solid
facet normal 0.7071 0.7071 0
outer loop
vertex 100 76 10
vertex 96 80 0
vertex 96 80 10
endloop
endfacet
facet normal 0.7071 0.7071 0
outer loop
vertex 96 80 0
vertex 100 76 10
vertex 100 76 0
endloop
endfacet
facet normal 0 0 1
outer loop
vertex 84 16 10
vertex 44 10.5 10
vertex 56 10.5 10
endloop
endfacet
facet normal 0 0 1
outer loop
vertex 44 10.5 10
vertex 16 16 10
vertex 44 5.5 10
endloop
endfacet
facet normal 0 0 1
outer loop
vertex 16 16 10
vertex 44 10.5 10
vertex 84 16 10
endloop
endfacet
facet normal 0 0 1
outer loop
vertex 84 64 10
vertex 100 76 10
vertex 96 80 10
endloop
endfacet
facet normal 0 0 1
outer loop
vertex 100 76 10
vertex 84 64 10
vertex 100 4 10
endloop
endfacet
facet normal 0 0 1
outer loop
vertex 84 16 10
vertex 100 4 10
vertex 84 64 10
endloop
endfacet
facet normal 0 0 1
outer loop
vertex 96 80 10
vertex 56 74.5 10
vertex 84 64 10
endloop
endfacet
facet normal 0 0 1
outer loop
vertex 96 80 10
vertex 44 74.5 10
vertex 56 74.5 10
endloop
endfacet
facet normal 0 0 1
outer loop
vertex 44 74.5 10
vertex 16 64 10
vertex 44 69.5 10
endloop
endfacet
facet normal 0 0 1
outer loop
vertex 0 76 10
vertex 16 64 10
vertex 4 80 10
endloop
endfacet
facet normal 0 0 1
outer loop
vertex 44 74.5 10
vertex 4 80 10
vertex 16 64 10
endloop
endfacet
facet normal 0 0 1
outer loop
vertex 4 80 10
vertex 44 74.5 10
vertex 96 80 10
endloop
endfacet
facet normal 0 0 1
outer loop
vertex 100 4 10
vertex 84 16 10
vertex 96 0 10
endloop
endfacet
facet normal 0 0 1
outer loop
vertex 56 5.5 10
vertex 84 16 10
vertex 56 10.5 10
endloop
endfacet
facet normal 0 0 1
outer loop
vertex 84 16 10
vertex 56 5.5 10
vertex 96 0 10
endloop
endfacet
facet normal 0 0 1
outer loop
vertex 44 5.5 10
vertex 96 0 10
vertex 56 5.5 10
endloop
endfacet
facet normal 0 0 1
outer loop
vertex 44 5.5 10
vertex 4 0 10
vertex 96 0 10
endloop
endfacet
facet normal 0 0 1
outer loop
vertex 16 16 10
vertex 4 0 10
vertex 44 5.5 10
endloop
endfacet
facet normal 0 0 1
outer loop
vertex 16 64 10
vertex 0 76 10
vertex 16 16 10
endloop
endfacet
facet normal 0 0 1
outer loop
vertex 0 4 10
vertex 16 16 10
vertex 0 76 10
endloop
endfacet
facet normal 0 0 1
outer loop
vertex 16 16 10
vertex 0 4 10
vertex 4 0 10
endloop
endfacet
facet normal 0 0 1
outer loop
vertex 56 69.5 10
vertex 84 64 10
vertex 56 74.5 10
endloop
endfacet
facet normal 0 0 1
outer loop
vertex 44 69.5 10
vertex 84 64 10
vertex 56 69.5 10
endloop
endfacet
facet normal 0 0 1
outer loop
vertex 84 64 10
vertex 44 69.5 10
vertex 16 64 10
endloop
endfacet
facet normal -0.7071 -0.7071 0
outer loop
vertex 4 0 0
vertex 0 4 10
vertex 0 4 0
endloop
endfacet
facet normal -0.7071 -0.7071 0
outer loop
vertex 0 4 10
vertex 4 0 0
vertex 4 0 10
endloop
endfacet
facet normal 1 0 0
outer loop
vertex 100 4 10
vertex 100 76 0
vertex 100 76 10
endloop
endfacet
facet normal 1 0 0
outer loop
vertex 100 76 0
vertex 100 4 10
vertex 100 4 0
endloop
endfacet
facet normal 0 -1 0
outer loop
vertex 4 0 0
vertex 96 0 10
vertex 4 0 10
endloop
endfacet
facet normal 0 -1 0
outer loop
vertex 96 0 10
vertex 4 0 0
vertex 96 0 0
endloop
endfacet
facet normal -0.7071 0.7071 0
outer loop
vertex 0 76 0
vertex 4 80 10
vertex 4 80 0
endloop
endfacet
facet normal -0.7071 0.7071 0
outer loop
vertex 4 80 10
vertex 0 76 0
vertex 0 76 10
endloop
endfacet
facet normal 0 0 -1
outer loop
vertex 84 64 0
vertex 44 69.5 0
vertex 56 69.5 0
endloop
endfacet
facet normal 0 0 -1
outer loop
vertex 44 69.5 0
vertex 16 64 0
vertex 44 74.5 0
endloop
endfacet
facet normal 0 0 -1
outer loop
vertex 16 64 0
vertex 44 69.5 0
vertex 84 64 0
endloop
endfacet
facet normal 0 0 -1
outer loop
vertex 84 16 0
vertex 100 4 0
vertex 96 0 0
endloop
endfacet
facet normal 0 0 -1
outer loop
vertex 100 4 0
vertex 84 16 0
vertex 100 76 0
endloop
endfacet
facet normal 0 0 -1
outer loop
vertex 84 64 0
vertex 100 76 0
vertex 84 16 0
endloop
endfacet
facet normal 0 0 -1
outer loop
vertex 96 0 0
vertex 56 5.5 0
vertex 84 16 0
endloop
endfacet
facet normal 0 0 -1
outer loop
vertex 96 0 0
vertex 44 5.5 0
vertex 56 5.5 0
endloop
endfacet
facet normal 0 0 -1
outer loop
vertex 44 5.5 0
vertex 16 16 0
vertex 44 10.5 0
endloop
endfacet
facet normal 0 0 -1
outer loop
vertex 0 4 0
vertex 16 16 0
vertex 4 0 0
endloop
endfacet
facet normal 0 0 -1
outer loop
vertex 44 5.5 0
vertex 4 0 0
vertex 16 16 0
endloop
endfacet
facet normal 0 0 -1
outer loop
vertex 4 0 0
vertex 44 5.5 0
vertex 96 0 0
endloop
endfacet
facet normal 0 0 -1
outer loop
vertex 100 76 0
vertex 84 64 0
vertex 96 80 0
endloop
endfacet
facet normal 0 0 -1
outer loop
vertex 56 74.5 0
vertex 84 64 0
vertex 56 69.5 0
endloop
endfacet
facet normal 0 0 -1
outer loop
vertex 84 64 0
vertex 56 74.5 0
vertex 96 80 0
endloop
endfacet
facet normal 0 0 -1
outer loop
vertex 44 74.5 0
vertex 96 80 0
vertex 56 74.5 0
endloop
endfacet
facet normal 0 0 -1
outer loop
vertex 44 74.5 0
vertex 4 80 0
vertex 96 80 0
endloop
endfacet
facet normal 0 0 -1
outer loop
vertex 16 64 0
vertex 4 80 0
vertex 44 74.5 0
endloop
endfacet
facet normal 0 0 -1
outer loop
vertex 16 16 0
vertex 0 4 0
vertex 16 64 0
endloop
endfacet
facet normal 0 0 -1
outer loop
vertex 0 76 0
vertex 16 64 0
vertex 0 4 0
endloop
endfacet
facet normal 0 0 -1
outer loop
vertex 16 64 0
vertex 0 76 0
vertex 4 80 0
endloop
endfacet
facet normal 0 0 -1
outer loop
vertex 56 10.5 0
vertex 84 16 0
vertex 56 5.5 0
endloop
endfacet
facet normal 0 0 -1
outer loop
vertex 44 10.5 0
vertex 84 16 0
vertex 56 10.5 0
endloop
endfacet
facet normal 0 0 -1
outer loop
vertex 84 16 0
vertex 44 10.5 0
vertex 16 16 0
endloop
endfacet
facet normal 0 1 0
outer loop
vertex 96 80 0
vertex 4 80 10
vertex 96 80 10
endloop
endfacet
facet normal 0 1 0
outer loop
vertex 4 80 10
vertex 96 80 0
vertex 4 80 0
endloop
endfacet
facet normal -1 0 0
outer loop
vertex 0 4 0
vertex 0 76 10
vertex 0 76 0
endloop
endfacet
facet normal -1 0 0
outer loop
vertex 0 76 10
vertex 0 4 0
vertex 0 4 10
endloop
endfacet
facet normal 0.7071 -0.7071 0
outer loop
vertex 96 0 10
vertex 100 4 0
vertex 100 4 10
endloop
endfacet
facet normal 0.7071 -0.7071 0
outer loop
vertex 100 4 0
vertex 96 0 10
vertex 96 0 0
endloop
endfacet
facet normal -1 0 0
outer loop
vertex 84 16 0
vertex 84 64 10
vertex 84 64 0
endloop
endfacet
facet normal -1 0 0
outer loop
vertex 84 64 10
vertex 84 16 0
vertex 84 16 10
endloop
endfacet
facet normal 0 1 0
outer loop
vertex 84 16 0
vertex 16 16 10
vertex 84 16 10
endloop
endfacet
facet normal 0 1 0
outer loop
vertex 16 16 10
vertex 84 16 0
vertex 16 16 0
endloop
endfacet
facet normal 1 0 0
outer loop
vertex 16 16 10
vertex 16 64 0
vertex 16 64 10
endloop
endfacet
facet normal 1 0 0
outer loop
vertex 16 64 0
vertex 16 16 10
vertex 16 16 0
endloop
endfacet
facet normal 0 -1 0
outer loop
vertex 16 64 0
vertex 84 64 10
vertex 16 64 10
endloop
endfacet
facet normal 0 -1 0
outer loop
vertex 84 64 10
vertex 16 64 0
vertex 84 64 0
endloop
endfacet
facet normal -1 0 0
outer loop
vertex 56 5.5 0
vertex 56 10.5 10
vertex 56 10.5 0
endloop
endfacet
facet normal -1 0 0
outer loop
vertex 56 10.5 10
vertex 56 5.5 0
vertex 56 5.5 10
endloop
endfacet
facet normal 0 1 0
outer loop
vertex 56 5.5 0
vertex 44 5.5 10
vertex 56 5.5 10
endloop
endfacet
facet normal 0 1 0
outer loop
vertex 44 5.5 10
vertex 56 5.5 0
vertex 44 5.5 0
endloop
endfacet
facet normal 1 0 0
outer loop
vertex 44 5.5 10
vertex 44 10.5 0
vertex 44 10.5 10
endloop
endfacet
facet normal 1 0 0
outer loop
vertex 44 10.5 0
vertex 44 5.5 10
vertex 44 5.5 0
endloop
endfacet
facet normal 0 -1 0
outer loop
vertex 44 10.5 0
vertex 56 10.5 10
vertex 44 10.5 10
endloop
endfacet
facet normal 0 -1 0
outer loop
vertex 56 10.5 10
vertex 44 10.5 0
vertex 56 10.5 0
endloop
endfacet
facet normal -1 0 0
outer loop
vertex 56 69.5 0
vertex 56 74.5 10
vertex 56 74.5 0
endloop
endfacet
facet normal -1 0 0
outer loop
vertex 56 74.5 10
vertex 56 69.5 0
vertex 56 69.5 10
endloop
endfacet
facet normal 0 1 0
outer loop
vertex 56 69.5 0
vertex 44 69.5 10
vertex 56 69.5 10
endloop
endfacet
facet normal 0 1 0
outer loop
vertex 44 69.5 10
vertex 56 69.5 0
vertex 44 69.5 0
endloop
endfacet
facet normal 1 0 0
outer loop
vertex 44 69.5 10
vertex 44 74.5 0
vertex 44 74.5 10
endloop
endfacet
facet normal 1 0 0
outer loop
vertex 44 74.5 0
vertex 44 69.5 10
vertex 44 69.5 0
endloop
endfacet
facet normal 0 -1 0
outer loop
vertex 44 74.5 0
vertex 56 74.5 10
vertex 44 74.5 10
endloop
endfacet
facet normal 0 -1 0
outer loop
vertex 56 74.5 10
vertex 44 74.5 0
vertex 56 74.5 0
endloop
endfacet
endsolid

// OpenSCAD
$fn = 32;

// ----------------------------------------------------------------------
// Frame plate: 100 x 80 frame, 16 mm rails
// ----------------------------------------------------------------------

// --- parameters (mm) ---
plate_l = 100;            // plate length, X
plate_w = 80;             // plate width, Y
plate_t = 10;             // plate thickness, Z (extrusion height)
corner_c = 4;             // corner chamfer
frame_bar = 16;           // frame rail width
slot_l = 12;              // adjustment slot length
slot_w = 5;               // adjustment slot width

win_l = plate_l - 2 * frame_bar;  // window length
win_w = plate_w - 2 * frame_bar;  // window width

profile = [[4, 0], [96, 0], [100, 4], [100, 76], [96, 80], [4, 80], [0, 76], [0, 4]];  // primary outline, 8 points, counter clockwise
void_1 = [[16, 16], [84, 16], [84, 64], [16, 64]];  // the window, 4 points
void_2 = [[44, 5.5], [56, 5.5], [56, 10.5], [44, 10.5]];  // adjustment slot, 4 points
void_3 = [[44, 69.5], [56, 69.5], [56, 74.5], [44, 74.5]];  // adjustment slot, 4 points

// --- the one profile operation ---
difference() {
  linear_extrude(height = plate_t) polygon(points = profile);
  translate([0, 0, -1])
    linear_extrude(height = plate_t + 2) polygon(points = void_1);
  translate([0, 0, -1])
    linear_extrude(height = plate_t + 2) polygon(points = void_2);
  translate([0, 0, -1])
    linear_extrude(height = plate_t + 2) polygon(points = void_3);
}
